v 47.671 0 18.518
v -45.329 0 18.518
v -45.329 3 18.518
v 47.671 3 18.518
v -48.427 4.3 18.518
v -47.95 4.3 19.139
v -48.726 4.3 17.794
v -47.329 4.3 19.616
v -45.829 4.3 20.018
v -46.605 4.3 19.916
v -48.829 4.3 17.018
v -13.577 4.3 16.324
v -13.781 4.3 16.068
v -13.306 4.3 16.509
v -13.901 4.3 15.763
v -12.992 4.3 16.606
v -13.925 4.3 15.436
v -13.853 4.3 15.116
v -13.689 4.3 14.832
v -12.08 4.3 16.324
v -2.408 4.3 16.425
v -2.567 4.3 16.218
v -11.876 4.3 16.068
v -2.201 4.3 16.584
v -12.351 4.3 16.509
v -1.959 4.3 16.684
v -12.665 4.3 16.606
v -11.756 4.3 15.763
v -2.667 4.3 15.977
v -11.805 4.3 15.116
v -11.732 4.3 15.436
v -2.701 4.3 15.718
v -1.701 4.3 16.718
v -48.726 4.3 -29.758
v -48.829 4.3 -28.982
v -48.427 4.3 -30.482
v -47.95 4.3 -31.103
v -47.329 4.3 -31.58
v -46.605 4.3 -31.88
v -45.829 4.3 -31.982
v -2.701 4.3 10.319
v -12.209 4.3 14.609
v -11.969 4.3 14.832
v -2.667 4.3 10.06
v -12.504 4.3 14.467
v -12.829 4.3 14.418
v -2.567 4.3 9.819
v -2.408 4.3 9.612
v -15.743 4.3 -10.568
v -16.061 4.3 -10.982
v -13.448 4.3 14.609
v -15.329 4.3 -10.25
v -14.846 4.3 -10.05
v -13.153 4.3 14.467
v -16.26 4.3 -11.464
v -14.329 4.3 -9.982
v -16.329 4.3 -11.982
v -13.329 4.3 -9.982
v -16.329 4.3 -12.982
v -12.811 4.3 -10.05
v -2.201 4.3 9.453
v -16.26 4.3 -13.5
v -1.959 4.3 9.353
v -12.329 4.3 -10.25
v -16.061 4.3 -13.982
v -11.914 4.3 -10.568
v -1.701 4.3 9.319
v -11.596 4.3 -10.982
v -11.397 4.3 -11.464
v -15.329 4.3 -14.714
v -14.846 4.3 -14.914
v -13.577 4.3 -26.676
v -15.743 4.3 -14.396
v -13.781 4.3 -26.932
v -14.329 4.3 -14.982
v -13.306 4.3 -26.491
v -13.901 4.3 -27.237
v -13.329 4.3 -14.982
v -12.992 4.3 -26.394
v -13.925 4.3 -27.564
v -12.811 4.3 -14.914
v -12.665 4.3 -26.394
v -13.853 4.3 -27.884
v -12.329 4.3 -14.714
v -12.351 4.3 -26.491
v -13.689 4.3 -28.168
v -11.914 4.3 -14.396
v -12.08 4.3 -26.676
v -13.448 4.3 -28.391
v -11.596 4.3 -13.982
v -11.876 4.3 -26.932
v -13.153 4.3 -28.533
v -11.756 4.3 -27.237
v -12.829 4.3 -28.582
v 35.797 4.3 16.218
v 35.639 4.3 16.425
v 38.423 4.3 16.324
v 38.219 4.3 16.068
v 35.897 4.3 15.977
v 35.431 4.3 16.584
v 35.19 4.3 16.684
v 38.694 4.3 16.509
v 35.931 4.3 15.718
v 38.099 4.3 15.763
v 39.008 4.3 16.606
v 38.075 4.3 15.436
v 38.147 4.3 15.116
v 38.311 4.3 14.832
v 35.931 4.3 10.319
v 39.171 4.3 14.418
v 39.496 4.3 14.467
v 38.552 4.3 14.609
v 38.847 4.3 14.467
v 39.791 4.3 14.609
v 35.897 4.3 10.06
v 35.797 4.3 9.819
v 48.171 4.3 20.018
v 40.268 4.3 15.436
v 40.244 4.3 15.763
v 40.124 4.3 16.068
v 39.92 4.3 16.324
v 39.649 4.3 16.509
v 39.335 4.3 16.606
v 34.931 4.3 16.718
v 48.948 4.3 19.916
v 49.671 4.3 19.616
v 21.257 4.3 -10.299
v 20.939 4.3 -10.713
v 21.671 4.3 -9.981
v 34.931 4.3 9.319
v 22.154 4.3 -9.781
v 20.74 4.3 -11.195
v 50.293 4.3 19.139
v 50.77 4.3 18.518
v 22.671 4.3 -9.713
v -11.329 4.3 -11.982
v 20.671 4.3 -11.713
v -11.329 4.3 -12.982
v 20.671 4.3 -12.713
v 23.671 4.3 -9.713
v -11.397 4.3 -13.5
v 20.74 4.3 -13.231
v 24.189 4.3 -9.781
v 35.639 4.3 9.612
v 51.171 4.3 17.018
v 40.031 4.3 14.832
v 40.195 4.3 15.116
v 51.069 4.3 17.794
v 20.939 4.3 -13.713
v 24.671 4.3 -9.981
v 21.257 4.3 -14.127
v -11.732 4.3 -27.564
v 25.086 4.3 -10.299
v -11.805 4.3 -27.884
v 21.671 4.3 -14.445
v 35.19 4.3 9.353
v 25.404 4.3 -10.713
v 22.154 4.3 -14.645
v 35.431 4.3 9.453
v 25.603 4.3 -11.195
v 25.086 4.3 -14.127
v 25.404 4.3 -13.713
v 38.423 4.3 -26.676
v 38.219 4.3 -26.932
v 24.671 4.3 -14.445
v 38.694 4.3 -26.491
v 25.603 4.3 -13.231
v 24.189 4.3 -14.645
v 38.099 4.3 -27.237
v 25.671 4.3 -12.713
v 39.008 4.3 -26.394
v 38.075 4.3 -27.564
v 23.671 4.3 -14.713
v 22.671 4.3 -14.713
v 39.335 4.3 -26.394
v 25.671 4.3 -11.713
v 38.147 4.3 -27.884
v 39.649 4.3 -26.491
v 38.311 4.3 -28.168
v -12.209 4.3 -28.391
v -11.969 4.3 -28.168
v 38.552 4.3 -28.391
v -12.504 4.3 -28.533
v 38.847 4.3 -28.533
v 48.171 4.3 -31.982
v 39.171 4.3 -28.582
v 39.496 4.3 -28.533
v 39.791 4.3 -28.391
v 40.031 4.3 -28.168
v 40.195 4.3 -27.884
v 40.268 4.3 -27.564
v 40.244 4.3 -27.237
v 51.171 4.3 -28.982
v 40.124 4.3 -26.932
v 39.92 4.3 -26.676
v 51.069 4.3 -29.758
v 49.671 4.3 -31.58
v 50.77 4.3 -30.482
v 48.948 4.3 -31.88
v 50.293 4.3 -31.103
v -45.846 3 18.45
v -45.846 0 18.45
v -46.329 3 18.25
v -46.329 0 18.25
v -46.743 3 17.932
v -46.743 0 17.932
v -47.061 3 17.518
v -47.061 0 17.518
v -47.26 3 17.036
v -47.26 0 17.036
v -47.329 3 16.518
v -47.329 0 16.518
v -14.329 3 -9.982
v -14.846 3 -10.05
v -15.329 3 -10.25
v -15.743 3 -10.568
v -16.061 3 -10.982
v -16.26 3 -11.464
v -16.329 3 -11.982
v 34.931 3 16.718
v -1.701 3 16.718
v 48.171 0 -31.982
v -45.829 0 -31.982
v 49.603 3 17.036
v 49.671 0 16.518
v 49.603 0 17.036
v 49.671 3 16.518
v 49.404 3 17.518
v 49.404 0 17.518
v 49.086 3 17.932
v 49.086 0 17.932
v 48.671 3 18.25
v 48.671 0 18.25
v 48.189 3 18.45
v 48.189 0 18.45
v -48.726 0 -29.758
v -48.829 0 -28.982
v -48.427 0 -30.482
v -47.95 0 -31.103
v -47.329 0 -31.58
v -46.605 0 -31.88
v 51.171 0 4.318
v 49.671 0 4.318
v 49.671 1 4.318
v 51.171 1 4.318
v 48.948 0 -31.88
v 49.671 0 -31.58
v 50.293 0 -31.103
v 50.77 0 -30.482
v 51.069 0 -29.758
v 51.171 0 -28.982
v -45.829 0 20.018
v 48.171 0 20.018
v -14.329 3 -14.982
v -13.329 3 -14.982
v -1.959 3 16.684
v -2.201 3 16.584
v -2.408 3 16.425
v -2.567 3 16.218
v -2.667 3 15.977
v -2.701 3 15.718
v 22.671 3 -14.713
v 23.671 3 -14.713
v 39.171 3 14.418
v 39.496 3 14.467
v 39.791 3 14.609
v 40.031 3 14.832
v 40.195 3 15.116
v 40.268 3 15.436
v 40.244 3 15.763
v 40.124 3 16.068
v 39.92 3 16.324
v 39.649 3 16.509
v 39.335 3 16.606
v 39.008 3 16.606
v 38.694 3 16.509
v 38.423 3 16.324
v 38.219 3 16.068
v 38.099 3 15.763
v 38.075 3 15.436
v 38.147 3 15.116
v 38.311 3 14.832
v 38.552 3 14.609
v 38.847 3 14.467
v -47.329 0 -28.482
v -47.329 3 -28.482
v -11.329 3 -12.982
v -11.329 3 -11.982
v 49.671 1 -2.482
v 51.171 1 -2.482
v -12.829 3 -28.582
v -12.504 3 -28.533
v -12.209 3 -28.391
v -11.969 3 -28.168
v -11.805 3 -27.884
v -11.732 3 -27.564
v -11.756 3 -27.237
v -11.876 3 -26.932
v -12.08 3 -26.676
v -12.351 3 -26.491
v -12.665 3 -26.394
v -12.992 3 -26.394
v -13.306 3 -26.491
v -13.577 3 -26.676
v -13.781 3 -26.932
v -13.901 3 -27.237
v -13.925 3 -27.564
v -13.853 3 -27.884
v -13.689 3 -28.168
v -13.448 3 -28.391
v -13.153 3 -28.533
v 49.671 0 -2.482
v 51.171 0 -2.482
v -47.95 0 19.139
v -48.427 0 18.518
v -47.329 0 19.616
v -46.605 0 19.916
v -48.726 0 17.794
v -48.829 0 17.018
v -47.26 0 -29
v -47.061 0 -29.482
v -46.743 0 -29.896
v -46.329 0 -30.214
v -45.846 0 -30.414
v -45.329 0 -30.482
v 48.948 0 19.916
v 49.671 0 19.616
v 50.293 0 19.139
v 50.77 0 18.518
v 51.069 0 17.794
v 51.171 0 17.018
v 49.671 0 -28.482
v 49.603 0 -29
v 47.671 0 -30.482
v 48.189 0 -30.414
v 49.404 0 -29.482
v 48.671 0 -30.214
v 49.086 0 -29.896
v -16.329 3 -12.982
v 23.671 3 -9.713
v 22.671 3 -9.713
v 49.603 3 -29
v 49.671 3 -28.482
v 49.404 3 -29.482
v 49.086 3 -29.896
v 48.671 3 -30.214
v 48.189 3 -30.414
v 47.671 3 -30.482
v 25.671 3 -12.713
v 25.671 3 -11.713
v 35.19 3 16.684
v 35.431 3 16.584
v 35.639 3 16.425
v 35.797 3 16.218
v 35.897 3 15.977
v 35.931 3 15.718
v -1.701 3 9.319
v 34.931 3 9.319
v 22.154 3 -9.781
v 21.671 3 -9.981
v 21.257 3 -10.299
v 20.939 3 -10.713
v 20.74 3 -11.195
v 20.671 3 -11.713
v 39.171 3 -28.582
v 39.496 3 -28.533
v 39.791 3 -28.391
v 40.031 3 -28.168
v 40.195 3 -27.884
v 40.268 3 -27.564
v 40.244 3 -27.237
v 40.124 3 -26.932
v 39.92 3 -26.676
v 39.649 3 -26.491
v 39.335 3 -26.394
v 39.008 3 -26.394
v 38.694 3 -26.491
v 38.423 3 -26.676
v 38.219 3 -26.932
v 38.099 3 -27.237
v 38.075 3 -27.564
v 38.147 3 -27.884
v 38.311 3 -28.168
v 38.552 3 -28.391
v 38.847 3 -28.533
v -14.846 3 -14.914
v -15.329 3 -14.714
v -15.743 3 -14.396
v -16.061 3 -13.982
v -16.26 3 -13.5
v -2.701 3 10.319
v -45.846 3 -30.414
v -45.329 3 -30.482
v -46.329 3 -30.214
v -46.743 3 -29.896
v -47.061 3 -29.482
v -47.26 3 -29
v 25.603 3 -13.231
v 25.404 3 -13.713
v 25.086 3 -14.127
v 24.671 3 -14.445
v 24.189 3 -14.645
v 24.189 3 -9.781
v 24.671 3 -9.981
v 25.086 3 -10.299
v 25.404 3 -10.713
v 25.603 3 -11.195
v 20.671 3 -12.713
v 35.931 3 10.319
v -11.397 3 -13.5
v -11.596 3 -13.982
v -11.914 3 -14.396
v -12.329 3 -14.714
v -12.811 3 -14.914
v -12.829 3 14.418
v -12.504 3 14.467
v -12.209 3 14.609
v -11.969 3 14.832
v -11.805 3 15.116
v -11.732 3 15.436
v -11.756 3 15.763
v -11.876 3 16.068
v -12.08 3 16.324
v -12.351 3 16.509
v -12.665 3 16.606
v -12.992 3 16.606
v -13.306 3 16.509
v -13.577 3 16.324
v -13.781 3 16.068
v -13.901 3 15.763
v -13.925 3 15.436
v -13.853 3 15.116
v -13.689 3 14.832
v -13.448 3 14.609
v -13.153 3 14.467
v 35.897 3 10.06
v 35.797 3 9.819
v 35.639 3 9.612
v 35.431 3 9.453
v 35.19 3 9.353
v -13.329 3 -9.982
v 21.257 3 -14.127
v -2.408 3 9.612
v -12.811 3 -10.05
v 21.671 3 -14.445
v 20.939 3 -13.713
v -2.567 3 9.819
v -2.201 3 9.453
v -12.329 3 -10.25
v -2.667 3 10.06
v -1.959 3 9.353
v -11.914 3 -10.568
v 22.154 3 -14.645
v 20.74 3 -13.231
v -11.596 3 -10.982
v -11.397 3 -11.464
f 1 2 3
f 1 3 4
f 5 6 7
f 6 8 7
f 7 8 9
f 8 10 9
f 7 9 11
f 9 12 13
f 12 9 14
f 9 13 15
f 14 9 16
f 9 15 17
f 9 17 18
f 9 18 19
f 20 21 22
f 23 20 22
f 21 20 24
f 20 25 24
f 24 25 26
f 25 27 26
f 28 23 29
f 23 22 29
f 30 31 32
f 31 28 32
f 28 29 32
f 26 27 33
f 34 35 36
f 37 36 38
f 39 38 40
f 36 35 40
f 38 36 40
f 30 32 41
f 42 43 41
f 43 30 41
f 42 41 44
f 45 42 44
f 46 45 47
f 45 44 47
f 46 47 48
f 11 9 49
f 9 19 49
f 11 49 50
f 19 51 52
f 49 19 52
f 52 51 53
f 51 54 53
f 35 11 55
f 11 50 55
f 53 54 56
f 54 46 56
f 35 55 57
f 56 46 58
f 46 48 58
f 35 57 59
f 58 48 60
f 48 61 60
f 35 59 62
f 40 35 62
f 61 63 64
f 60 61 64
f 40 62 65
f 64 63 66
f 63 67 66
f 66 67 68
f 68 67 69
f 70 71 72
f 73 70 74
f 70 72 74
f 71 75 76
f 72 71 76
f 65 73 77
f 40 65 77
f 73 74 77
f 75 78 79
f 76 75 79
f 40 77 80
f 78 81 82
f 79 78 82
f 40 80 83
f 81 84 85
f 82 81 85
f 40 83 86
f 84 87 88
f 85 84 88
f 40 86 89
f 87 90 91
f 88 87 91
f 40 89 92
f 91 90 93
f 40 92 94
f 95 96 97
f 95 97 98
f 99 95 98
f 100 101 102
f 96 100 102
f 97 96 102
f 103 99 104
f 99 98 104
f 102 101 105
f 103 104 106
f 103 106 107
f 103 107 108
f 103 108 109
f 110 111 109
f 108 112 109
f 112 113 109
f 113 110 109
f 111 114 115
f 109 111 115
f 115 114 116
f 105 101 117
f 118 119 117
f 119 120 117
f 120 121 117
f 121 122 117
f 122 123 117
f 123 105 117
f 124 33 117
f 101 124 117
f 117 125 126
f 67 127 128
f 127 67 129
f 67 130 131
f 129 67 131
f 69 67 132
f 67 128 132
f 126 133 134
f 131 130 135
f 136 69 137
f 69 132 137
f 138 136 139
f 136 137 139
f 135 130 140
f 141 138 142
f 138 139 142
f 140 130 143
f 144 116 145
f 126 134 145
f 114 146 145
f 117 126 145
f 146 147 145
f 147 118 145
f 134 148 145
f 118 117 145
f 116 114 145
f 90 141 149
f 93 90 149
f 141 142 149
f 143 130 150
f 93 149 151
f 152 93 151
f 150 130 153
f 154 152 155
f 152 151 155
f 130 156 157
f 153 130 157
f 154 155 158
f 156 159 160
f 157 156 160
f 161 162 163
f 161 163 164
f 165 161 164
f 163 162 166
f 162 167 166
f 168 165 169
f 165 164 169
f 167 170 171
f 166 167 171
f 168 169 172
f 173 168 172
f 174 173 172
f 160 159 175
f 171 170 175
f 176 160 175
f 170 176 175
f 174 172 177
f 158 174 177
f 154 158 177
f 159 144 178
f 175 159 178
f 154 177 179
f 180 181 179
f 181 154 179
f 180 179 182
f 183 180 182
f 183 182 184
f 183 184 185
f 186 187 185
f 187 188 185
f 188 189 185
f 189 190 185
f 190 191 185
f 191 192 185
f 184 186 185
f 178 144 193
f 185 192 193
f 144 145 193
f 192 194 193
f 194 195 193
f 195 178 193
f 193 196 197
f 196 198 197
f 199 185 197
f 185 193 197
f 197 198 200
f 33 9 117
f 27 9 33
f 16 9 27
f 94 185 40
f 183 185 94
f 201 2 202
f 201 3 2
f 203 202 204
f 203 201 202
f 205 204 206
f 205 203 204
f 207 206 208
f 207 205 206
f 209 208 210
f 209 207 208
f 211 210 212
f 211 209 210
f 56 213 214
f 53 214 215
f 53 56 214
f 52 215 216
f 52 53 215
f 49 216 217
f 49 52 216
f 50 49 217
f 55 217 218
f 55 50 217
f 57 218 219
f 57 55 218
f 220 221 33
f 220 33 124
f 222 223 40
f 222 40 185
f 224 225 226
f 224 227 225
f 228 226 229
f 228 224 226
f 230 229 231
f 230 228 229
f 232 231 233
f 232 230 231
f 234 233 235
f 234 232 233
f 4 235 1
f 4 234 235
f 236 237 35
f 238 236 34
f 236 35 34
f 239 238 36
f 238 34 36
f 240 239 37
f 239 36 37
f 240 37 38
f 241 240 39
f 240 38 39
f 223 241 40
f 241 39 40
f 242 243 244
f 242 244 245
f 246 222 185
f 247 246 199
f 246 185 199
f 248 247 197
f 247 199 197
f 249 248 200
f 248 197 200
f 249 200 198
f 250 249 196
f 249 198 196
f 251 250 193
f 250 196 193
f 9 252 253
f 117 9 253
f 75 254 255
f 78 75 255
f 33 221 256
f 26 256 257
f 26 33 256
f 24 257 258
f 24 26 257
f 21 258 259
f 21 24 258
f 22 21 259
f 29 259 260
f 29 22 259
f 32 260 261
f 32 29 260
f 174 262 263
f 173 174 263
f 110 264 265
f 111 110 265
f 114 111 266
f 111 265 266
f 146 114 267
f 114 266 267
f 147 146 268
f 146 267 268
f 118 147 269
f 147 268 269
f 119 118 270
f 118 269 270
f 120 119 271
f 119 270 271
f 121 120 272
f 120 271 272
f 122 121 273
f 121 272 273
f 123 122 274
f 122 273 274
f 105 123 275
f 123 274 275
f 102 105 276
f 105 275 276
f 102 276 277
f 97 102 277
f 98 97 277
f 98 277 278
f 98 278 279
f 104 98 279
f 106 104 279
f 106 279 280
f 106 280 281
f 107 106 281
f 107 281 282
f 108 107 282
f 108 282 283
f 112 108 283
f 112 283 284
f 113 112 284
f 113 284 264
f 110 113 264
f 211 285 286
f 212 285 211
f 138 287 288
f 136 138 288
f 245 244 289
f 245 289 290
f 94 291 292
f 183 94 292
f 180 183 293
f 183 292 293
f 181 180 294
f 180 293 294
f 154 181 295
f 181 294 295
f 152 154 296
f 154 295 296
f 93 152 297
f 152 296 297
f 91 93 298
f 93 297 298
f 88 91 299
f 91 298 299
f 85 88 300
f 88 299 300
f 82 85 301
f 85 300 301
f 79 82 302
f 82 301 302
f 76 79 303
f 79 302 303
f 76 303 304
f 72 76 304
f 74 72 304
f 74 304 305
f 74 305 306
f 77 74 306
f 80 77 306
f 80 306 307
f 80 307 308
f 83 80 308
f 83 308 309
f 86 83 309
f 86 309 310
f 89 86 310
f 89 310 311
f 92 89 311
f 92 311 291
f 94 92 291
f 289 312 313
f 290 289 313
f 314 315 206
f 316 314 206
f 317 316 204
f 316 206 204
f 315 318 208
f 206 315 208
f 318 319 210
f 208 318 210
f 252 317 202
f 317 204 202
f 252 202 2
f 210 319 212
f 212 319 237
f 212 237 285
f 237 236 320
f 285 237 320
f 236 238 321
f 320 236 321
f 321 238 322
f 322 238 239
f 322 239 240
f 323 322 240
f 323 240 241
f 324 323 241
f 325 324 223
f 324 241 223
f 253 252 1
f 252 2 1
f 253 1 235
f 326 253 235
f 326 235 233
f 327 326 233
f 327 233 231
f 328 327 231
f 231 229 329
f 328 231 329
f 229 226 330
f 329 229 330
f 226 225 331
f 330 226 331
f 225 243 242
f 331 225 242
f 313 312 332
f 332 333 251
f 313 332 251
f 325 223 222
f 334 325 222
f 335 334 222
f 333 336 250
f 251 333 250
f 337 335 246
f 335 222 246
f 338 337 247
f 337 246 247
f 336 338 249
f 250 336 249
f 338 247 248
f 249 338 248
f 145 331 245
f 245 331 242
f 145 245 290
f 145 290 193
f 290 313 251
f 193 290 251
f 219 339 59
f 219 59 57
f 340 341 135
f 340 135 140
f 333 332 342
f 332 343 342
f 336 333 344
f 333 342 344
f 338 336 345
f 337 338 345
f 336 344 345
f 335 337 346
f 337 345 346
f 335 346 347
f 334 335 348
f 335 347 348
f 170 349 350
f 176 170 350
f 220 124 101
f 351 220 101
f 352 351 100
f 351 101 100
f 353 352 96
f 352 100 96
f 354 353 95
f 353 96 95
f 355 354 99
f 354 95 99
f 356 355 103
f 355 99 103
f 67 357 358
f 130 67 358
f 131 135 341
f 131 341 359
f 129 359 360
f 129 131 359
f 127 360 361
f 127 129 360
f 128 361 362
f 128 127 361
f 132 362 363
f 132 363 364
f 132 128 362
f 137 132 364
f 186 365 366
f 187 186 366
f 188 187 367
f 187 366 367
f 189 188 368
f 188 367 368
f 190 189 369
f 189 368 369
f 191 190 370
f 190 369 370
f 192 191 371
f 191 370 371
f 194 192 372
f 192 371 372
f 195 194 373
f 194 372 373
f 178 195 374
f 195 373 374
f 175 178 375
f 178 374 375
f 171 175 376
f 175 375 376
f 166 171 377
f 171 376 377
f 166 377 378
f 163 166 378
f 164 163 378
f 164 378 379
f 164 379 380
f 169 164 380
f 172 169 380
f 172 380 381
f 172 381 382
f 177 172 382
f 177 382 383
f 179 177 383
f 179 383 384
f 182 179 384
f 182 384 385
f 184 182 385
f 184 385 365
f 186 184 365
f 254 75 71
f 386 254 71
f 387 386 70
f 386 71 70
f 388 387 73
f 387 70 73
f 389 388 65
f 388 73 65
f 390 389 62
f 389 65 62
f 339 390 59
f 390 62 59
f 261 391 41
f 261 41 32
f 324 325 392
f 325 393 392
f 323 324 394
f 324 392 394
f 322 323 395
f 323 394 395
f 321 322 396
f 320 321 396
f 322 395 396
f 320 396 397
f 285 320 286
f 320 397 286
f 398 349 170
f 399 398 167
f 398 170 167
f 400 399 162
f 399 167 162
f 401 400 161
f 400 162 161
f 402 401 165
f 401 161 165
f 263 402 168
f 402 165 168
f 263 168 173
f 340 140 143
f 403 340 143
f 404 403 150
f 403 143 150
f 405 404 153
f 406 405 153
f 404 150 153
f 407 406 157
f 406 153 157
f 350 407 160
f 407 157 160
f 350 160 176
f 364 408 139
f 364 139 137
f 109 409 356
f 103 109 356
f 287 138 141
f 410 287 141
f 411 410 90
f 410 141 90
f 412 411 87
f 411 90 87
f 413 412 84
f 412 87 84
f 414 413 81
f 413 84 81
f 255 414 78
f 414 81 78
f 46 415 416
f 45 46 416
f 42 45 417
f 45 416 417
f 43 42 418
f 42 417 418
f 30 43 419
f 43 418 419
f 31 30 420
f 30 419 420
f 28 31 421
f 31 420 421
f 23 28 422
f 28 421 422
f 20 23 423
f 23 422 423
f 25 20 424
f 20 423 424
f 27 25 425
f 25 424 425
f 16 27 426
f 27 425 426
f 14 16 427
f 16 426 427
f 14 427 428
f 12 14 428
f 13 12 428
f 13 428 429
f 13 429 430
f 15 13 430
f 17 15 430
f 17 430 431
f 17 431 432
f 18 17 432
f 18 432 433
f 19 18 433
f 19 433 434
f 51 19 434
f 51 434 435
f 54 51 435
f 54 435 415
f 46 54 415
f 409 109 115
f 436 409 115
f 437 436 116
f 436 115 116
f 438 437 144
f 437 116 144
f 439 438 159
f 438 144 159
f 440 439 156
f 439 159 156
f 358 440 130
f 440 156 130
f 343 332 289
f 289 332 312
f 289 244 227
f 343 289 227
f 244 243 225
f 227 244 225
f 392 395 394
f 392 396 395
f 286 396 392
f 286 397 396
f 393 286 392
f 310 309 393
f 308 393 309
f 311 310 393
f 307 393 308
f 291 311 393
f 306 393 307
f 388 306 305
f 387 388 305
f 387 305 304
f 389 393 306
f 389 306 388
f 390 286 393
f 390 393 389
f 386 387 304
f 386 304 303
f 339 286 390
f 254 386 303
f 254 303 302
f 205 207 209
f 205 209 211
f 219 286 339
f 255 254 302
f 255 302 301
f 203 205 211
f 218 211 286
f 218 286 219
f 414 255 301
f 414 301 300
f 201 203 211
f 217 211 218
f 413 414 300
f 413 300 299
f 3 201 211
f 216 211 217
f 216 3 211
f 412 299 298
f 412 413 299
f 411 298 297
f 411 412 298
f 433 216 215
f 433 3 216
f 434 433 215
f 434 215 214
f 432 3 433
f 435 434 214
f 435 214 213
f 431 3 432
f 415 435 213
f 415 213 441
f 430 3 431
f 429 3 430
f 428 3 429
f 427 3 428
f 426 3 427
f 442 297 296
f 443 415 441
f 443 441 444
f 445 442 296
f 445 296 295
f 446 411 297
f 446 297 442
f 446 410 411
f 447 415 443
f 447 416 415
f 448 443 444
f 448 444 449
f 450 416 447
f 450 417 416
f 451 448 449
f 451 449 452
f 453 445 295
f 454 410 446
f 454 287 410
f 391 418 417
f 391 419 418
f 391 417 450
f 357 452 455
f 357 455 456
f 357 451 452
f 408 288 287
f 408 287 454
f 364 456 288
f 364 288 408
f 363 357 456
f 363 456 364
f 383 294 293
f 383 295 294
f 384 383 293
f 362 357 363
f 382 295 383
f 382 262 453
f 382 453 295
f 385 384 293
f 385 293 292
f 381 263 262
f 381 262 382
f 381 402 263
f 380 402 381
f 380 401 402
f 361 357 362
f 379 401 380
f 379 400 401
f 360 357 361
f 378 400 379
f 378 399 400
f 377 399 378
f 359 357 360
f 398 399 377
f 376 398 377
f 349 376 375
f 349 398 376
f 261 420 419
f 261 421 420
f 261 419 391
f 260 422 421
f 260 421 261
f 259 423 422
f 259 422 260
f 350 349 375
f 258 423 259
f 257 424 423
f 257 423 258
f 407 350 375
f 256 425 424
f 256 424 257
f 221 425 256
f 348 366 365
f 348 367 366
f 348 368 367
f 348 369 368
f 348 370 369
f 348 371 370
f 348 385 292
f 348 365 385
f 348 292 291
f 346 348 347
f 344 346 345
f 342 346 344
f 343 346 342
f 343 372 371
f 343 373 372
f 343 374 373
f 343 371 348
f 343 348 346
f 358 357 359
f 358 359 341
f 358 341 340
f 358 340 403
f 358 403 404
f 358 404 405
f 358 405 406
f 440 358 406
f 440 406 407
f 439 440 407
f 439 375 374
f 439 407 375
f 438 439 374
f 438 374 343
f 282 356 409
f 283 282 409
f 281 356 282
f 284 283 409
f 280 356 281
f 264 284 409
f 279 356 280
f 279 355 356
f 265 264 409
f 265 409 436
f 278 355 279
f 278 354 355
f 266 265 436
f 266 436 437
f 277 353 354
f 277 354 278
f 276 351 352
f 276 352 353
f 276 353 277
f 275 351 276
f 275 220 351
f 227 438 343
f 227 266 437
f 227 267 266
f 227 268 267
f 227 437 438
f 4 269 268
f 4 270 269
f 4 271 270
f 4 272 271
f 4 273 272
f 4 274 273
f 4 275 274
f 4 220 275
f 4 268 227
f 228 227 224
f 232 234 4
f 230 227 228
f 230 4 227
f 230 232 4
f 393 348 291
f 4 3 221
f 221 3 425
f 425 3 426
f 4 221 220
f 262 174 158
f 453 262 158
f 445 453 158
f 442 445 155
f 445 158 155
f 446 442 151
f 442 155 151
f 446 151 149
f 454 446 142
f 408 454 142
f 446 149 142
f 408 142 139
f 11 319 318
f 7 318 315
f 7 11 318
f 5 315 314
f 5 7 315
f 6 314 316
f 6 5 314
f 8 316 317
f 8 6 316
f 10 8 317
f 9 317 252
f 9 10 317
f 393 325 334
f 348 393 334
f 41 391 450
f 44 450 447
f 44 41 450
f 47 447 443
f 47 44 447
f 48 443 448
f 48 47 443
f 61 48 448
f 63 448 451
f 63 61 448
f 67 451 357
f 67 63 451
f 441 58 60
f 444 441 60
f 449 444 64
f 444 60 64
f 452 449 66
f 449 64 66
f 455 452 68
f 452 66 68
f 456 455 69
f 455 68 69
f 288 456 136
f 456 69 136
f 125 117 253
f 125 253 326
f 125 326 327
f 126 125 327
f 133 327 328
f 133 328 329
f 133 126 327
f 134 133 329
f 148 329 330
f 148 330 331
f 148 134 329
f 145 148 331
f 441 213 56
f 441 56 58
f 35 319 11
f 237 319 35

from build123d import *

# Parameters (mm, degrees)
SKETCH_1_W          = 100
SKETCH_1_H          = 52
EXTRUDE_1_DEPTH     = 8.6
SKETCH_2_W          = 97
SKETCH_2_H          = 49
CUT_EXTRUDE_1_DEPTH = 3
SKETCH_3_R          = 1.1
SKETCH_3_W          = 38.632034186
SKETCH_3_H          = 7.399361665
SKETCH_3_W_2        = 5
SKETCH_3_H_2        = 5
CUT_EXTRUDE_2_DEPTH = 61.603041755
FILLET_1_R          = 2
SKETCH_4_W          = 1.5
SKETCH_4_H          = 6.8
CUT_EXTRUDE_3_DEPTH = 1
SKETCH_5_W          = 97
SKETCH_5_H          = 49
CUT_EXTRUDE_4_DEPTH = 3
EXTRUDE_2_DEPTH     = 3
FILLET_2_R          = 3
FILLET_3_R          = 2
FILLET_5_R          = 1
SKETCH_9_W          = 52
SKETCH_9_H          = 4.3
CUT_EXTRUDE_5_DEPTH = 106.341399486


with BuildPart() as part:
    # 草图1 → 凸台-拉伸1 (new body)
    with BuildSketch(Plane(origin=(0, 0, 0), x_dir=(1, 0, 0), z_dir=(0, 1, 0))):
        with Locations((1.17145908, 5.982033169)):
            Rectangle(SKETCH_1_W, SKETCH_1_H)
    extrude(amount=EXTRUDE_1_DEPTH)

    # 草图2 → 切除-拉伸1 (cut)
    with BuildSketch(Plane.XZ):
        with Locations((1.17145908, -5.982033169)):
            Rectangle(SKETCH_2_W, SKETCH_2_H)
    extrude(amount=-CUT_EXTRUDE_1_DEPTH, mode=Mode.SUBTRACT)

    # 草图3 → 切除-拉伸2 (cut, through all)
    with BuildSketch(Plane.XZ.offset(-3)):
        with Locations(Location((-12.82854092, 15.517966831, 0), (0, 0, 270))):
            Circle(SKETCH_3_R)
        with Locations(Location((39.17145908, 15.517966831, 0), (0, 0, 270))):
            Circle(SKETCH_3_R)
        with Locations(Location((39.17145908, -27.482033169, 0), (0, 0, 270))):
            Circle(SKETCH_3_R)
        with Locations(Location((-12.82854092, -27.482033169, 0), (0, 0, 270))):
            Circle(SKETCH_3_R)
        with Locations((16.615396969, 13.018709543)):
            Rectangle(SKETCH_3_W, SKETCH_3_H)
        with Locations((-13.82854092, -12.482033169)):
            Rectangle(SKETCH_3_W_2, SKETCH_3_H_2)
        with Locations((23.17145908, -12.21289677)):
            Rectangle(SKETCH_3_W_2, SKETCH_3_H_2)
    extrude(amount=-CUT_EXTRUDE_2_DEPTH, mode=Mode.SUBTRACT)

    # 圆角1
    fillet_1_edges = [part.edges().sort_by_distance(p)[0] for p in [
        (20.67145908, 5.8, -14.71289677),
        (20.67145908, 5.8, -9.71289677),
        (25.67145908, 5.8, -9.71289677),
        (25.67145908, 5.8, -14.71289677),
        (-16.32854092, 5.8, -14.982033169),
        (-16.32854092, 5.8, -9.982033169),
        (-11.32854092, 5.8, -9.982033169),
        (-11.32854092, 5.8, -14.982033169),
    ]]
    fillet(fillet_1_edges, radius=FILLET_1_R)

    # 草图4 → 切除-拉伸3 (cut)
    with BuildSketch(Plane.XZ):
        with Locations((50.42145908, 0.917966831)):
            Rectangle(SKETCH_4_W, SKETCH_4_H)
    extrude(amount=-CUT_EXTRUDE_3_DEPTH, mode=Mode.SUBTRACT)

    # 草图5 → 切除-拉伸4 (cut)
    with BuildSketch(Plane(origin=(0, 8.6, 0), x_dir=(1, 0, 0), z_dir=(0, 1, 0))):
        with Locations((1.17145908, 5.982033169)):
            Rectangle(SKETCH_5_W, SKETCH_5_H)
    extrude(amount=-CUT_EXTRUDE_4_DEPTH, mode=Mode.SUBTRACT)

    # 草图7 → 凸台-拉伸2 (add, through all)
    with BuildSketch(Plane(origin=(0, 5.6, 0), x_dir=(1, 0, 0), z_dir=(0, 1, 0))):
        Polygon((-8.68854092, -18.517966831), (-8.68854092, 4.782033169), (-27.62854092, 4.782033169), (-27.62854092, 30.482033169), (-26.12854092, 30.482033169), (-26.12854092, 6.282033169), (-8.68854092, 6.282033169), (-8.68854092, 30.482033169), (-7.18854092, 30.482033169), (-7.18854092, -4.517966831), (49.67145908, -4.517966831), (49.67145908, -6.017966831), (-7.18854092, -6.017966831), (-7.18854092, -18.517966831), align=None)
        Polygon((16.97145908, 30.482033169), (16.97145908, 6.682033169), (30.17145908, 6.682033169), (30.17145908, 30.482033169), (28.67145908, 30.482033169), (28.67145908, 8.182033169), (18.47145908, 8.182033169), (18.47145908, 30.482033169), align=None)
    extrude(amount=EXTRUDE_2_DEPTH)

    # 圆角2
    fillet_2_edges = [part.edges().sort_by_distance(p)[0] for p in [
        (-48.82854092, 4.3, -31.982033169),
        (51.17145908, 4.3, -31.982033169),
        (51.17145908, 4.3, 20.017966831),
        (-48.82854092, 4.3, 20.017966831),
    ]]
    fillet(fillet_2_edges, radius=FILLET_2_R)

    # 圆角3
    fillet_3_edges = [part.edges().sort_by_distance(p)[0] for p in [
        (49.67145908, 1.5, 18.517966831),
        (49.67145908, 1.5, -30.482033169),
        (-47.32854092, 1.5, -30.482033169),
        (-47.32854092, 1.5, 18.517966831),
        (-47.32854092, 7.1, 18.517966831),
        (-47.32854092, 7.1, -30.482033169),
        (49.67145908, 7.1, -30.482033169),
        (49.67145908, 7.1, 18.517966831),
        (-8.68854092, 7.1, 18.517966831),
        (-7.18854092, 7.1, 18.517966831),
        (-7.18854092, 7.1, 6.017966831),
        (49.67145908, 7.1, 6.017966831),
        (49.67145908, 7.1, 4.517966831),
        (-7.18854092, 7.1, 4.517966831),
        (-7.18854092, 7.1, -30.482033169),
        (-8.68854092, 7.1, -30.482033169),
        (-8.68854092, 7.1, -6.282033169),
        (-26.12854092, 7.1, -6.282033169),
        (-26.12854092, 7.1, -30.482033169),
        (-27.62854092, 7.1, -30.482033169),
        (-27.62854092, 7.1, -4.782033169),
        (-8.68854092, 7.1, -4.782033169),
        (18.47145908, 7.1, -30.482033169),
        (16.97145908, 7.1, -30.482033169),
        (16.97145908, 7.1, -6.682033169),
        (30.17145908, 7.1, -6.682033169),
        (30.17145908, 7.1, -30.482033169),
        (28.67145908, 7.1, -30.482033169),
        (28.67145908, 7.1, -8.182033169),
        (18.47145908, 7.1, -8.182033169),
    ]]
    fillet(fillet_3_edges, radius=FILLET_3_R)

    # 圆角5
    fillet_5_edges = [part.edges().sort_by_distance(p)[0] for p in [
        (-2.700620124, 4.3, 16.718390375),
        (35.931414062, 4.3, 16.718390375),
        (-2.700620124, 4.3, 9.31902871),
        (35.931414062, 4.3, 9.31902871),
    ]]
    fillet(fillet_5_edges, radius=FILLET_5_R)

    # 草图9 → 切除-拉伸5 (cut, through all)
    with BuildSketch(Plane(origin=(51.17145908, 0, 0), x_dir=(0, 0, -1), z_dir=(1, 0, 0))):
        with Locations((5.982033169, 6.45)):
            Rectangle(SKETCH_9_W, SKETCH_9_H)
    extrude(amount=-CUT_EXTRUDE_5_DEPTH, mode=Mode.SUBTRACT)


solid = part.part
